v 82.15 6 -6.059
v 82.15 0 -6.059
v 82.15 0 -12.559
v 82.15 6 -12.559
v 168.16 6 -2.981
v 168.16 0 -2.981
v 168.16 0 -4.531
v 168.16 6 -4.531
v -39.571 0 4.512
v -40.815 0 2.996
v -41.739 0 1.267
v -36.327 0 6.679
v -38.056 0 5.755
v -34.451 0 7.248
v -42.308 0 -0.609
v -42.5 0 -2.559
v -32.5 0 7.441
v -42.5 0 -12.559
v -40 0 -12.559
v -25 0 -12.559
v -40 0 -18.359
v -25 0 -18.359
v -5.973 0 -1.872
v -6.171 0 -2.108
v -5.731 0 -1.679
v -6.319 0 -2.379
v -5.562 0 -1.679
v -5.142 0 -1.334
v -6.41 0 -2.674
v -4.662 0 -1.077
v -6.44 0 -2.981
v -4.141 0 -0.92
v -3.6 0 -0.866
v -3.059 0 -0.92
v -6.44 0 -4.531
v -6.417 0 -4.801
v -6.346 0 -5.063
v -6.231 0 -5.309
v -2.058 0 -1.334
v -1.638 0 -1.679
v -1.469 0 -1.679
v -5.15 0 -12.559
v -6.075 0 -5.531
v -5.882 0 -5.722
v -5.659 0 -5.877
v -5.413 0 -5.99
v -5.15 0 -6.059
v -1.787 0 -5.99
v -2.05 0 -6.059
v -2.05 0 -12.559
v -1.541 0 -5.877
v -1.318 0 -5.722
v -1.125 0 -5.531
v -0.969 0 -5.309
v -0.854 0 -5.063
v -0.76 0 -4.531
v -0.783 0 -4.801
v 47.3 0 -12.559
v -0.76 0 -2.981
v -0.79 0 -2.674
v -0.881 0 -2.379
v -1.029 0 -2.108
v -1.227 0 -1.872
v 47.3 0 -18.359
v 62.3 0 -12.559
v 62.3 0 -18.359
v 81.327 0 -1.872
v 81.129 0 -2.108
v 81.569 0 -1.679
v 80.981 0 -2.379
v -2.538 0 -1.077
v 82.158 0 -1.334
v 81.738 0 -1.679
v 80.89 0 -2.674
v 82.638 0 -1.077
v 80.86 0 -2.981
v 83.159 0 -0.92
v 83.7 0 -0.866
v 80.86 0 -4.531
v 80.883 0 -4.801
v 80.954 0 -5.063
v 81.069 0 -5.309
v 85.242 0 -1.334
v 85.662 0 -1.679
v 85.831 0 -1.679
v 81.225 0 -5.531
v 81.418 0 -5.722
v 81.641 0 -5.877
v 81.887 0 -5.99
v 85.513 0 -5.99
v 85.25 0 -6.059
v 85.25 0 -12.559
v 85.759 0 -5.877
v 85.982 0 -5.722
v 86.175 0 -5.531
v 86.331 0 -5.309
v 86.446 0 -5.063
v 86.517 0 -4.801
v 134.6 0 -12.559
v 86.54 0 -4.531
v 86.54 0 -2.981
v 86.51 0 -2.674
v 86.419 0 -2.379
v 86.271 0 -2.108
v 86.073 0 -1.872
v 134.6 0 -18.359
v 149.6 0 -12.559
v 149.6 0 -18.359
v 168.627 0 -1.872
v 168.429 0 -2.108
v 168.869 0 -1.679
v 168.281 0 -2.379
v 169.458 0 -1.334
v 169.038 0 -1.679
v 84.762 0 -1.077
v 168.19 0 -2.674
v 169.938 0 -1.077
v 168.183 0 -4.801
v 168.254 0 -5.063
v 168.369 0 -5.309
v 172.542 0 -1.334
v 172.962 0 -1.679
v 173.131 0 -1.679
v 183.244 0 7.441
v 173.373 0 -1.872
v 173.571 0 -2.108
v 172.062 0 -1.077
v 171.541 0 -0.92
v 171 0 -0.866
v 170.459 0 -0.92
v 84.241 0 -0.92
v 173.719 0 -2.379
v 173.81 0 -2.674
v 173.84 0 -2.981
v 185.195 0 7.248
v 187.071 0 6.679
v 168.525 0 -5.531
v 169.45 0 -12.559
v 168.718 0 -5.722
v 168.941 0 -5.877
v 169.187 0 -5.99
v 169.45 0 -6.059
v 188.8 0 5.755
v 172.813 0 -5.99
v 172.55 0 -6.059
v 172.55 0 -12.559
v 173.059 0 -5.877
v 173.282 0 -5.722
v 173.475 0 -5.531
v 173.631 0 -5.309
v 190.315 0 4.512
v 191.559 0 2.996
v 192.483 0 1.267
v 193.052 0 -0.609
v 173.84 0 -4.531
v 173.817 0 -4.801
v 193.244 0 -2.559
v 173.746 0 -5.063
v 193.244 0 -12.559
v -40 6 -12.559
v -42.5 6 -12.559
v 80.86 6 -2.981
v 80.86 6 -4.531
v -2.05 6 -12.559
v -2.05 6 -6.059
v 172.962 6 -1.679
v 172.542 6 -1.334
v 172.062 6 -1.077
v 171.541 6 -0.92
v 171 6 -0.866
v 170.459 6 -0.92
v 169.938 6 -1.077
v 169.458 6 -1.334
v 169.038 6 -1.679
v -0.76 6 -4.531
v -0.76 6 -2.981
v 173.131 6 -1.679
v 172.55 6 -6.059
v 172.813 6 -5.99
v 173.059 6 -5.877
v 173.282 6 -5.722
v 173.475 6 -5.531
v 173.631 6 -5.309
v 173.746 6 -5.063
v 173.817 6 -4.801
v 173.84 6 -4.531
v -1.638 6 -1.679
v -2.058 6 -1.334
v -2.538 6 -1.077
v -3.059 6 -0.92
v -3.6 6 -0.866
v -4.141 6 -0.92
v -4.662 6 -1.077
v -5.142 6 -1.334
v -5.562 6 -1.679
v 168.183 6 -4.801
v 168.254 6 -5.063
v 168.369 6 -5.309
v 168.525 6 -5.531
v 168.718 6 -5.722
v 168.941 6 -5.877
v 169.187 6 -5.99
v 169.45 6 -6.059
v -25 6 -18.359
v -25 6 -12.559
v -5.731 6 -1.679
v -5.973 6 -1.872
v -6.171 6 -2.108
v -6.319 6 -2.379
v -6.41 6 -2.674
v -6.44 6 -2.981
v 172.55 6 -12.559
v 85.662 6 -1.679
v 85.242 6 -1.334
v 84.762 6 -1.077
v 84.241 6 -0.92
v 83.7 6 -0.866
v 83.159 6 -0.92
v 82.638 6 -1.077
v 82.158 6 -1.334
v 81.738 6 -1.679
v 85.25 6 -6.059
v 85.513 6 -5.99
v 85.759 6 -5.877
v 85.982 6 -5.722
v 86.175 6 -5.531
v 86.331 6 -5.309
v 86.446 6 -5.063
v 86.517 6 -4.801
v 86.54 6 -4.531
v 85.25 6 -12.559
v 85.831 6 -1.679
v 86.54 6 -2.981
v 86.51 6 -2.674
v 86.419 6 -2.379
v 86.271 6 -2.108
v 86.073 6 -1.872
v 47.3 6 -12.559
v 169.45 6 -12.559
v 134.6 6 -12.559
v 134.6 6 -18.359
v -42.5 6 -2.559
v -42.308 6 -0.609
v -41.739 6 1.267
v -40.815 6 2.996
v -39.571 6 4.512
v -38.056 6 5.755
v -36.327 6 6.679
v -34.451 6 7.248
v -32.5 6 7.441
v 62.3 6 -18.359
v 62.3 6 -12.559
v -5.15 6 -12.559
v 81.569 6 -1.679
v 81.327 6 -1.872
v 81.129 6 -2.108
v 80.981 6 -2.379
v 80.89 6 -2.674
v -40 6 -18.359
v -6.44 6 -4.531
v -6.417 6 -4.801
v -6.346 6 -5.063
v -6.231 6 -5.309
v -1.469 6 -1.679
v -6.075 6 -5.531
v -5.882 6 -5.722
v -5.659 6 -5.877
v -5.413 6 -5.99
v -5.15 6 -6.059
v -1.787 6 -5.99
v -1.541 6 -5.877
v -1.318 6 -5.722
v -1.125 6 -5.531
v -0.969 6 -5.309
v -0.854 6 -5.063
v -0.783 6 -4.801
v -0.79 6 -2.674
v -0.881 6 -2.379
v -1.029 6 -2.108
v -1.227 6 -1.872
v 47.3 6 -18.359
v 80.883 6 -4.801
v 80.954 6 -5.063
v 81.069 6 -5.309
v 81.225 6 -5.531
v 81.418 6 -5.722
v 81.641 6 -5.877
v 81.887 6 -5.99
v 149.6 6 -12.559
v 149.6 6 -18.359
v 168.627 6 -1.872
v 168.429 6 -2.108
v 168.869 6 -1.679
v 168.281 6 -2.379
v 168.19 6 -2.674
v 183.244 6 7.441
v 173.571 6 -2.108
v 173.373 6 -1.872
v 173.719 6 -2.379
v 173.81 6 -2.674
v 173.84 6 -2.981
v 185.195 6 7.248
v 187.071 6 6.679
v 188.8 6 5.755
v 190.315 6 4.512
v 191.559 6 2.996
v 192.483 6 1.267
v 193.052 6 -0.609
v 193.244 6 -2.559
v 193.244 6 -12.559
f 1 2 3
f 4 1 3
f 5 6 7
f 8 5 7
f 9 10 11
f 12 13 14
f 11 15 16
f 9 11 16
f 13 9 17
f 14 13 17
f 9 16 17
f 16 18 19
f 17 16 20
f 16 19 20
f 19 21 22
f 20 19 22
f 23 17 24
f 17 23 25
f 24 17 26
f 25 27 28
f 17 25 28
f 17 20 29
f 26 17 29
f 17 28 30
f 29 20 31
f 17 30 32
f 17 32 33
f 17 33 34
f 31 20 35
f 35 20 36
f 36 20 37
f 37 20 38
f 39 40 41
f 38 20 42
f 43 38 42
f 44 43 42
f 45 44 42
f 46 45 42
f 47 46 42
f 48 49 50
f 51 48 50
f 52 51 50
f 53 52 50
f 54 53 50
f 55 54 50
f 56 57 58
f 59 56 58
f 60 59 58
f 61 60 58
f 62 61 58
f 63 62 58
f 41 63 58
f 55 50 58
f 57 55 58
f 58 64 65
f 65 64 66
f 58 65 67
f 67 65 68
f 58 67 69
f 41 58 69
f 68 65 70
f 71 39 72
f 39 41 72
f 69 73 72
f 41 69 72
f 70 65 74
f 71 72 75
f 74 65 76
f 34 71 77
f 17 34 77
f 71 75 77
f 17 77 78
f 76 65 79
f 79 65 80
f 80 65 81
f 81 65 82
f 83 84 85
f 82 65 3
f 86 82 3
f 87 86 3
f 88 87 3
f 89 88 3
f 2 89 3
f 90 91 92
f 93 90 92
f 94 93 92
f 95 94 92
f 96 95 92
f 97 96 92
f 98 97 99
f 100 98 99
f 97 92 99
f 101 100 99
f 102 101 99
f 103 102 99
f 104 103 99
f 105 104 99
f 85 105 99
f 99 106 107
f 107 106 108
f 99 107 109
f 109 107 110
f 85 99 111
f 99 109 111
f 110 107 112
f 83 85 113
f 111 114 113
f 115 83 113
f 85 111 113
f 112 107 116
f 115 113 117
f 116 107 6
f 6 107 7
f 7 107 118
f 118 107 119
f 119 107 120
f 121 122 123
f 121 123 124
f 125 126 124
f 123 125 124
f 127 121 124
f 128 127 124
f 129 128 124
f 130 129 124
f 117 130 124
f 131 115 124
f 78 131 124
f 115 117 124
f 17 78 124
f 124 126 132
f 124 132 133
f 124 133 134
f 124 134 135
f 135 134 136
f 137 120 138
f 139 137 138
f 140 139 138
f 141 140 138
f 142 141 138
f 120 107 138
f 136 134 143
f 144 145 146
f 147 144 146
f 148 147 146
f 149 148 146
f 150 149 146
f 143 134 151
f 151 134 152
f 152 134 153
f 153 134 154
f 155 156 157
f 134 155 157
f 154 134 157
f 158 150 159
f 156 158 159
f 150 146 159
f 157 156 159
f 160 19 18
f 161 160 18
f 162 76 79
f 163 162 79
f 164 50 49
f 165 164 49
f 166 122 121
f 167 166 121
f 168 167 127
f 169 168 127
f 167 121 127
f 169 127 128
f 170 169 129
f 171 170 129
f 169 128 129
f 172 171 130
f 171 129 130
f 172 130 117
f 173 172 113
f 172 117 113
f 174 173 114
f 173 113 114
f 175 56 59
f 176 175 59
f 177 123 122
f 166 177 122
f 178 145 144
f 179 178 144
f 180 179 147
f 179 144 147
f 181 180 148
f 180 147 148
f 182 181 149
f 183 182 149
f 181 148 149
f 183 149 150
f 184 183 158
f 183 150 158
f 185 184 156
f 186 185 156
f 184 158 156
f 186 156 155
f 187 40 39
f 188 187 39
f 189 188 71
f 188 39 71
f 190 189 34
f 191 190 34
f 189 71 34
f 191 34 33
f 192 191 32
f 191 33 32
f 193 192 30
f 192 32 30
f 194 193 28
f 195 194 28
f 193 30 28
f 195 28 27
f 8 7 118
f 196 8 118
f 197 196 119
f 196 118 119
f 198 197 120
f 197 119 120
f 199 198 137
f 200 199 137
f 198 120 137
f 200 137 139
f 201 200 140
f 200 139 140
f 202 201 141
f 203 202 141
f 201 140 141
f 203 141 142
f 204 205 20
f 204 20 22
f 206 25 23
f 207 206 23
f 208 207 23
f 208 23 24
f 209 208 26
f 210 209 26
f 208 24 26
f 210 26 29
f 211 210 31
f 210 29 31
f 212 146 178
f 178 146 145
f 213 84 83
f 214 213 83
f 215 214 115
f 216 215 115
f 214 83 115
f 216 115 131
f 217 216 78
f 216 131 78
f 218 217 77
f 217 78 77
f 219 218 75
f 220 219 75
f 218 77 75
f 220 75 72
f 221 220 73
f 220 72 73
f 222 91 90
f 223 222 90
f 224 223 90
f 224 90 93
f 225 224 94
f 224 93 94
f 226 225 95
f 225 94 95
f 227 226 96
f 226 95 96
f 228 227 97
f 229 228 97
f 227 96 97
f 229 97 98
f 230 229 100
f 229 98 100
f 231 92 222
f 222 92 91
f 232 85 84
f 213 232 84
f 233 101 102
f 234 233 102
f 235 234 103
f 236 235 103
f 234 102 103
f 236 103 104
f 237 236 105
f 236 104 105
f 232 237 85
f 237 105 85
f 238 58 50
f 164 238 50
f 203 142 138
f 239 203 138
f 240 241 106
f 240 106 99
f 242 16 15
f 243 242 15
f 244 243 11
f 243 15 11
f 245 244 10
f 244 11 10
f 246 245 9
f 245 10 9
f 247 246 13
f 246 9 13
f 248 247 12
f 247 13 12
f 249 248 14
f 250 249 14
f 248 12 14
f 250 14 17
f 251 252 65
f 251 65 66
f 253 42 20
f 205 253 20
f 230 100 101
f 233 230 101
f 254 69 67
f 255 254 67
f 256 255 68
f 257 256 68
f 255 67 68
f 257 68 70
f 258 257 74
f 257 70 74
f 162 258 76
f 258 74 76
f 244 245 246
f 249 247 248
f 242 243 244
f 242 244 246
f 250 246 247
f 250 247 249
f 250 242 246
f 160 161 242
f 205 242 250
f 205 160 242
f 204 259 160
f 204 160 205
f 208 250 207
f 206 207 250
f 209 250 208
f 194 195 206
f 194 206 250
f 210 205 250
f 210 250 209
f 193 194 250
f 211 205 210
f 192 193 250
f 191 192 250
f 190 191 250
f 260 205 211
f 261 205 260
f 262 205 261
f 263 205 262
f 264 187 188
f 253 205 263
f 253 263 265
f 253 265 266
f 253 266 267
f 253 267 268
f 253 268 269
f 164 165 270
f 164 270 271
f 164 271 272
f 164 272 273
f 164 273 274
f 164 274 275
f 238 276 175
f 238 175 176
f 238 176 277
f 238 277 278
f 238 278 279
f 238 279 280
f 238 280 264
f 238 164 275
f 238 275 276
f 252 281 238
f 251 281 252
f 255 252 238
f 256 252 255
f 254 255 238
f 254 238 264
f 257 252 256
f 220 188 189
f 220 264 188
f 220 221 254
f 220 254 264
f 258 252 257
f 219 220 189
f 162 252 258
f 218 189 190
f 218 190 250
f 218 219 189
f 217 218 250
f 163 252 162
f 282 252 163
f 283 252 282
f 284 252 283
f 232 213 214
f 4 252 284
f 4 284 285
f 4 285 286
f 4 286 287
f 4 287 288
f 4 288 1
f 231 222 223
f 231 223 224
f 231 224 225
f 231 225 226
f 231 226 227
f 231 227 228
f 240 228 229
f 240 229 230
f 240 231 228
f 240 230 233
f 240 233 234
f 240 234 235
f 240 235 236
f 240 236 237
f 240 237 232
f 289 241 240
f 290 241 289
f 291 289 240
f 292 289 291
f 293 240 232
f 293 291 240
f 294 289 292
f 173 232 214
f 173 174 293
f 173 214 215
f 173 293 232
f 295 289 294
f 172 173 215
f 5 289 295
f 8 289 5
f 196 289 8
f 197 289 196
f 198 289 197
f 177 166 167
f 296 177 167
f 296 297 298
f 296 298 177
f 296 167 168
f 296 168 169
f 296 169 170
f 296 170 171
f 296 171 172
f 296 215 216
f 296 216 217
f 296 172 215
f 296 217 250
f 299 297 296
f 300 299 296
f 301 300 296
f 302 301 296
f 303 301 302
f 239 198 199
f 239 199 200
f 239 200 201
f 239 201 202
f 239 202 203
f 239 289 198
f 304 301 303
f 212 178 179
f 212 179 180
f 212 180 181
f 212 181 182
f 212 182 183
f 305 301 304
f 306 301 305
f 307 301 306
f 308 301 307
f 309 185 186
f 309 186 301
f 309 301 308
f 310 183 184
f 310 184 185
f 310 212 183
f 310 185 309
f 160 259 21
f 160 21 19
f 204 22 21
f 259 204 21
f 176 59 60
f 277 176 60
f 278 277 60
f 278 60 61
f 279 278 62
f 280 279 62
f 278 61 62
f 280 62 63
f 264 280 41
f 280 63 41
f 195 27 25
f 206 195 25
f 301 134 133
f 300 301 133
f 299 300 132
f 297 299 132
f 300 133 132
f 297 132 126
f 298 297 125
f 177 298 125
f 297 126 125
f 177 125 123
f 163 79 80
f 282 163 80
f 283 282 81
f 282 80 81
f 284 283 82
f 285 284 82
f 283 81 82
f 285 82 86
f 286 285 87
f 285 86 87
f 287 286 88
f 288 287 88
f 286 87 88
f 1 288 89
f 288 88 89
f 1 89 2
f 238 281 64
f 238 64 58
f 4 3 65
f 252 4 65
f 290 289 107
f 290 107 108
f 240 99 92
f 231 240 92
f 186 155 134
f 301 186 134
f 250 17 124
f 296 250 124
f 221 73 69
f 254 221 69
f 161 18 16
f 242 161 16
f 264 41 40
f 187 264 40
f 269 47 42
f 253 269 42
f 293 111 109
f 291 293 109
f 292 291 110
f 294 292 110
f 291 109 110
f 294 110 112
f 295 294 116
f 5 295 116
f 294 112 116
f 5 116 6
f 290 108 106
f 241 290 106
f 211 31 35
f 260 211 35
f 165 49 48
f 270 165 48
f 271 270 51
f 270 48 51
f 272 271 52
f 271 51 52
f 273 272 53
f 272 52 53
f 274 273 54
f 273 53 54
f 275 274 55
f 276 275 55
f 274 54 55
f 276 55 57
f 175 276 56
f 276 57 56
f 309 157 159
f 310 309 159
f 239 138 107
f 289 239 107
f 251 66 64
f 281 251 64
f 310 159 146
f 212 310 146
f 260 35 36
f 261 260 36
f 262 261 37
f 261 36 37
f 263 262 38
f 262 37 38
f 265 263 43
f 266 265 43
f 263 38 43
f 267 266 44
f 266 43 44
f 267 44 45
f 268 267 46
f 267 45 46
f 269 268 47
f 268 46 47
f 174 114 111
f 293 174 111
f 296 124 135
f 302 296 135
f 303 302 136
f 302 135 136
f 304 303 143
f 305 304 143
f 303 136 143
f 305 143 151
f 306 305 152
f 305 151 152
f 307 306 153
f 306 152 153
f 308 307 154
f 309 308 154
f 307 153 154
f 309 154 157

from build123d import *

# Parameters (mm, degrees)
SALIENTE_EXTRUIR1_DEPTH = 6


with BuildPart() as part:
    # Croquis1 → Saliente-Extruir1 (new body)
    with BuildSketch(Plane(origin=(0, 0, 0), x_dir=(1, 0, 0), z_dir=(0, 1, 0))):
        with BuildLine():
            Line((193.24437935, 2.559419019), (193.24437935, 12.559419019))
            Line((193.24437935, 12.559419019), (172.55, 12.559419019))
            Line((172.55, 12.559419019), (172.55, 6.059193777))
            ThreePointArc((172.55, 6.059193777), (173.474604635, 5.531104241), (173.840337631, 4.531098409))
            Line((173.840337631, 4.531098409), (173.840337631, 2.981098409))
            ThreePointArc((173.840337631, 2.981098409), (173.651640801, 2.239914437), (173.131494174, 1.679193777))
            Line((173.131494174, 1.679193777), (172.962249241, 1.679193777))
            ThreePointArc((172.962249241, 1.679193777), (171, 0.866183792), (169.037750759, 1.679193777))
            Line((169.037750759, 1.679193777), (168.868505826, 1.679193777))
            ThreePointArc((168.868505826, 1.679193777), (168.348359199, 2.239914437), (168.159662369, 2.981098409))
            Line((168.159662369, 2.981098409), (168.159662369, 4.531098409))
            ThreePointArc((168.159662369, 4.531098409), (168.525395365, 5.531104241), (169.45, 6.059193777))
            Line((169.45, 6.059193777), (169.45, 12.559419019))
            Line((169.45, 12.559419019), (152.1, 12.559419019))
            Line((152.1, 12.559419019), (149.6, 12.559419019))
            Line((149.6, 12.559419019), (149.6, 18.359419019))
            Line((149.6, 18.359419019), (134.6, 18.359419019))
            Line((134.6, 18.359419019), (134.6, 12.559419019))
            Line((134.6, 12.559419019), (132.1, 12.559419019))
            Line((132.1, 12.559419019), (85.25, 12.559419019))
            Line((85.25, 12.559419019), (85.25, 6.059193777))
            ThreePointArc((85.25, 6.059193777), (86.174604635, 5.531104241), (86.540337631, 4.531098409))
            Line((86.540337631, 4.531098409), (86.540337631, 2.981098409))
            ThreePointArc((86.540337631, 2.981098409), (86.351640801, 2.239914437), (85.831494174, 1.679193777))
            Line((85.831494174, 1.679193777), (85.662249241, 1.679193777))
            ThreePointArc((85.662249241, 1.679193777), (83.7, 0.866183792), (81.737750759, 1.679193777))
            Line((81.737750759, 1.679193777), (81.568505826, 1.679193777))
            ThreePointArc((81.568505826, 1.679193777), (81.048359199, 2.239914437), (80.859662369, 2.981098409))
            Line((80.859662369, 2.981098409), (80.859662369, 4.531098409))
            ThreePointArc((80.859662369, 4.531098409), (81.225395365, 5.531104241), (82.15, 6.059193777))
            Line((82.15, 6.059193777), (82.15, 12.559419019))
            Line((82.15, 12.559419019), (64.8, 12.559419019))
            Line((64.8, 12.559419019), (62.3, 12.559419019))
            Line((62.3, 12.559419019), (62.3, 18.359419019))
            Line((62.3, 18.359419019), (47.3, 18.359419019))
            Line((47.3, 18.359419019), (47.3, 12.559419019))
            Line((47.3, 12.559419019), (44.8, 12.559419019))
            Line((44.8, 12.559419019), (-2.05, 12.559419019))
            Line((-2.05, 12.559419019), (-2.05, 6.059193777))
            ThreePointArc((-2.05, 6.059193777), (-1.125395365, 5.531104241), (-0.759662369, 4.531098409))
            Line((-0.759662369, 4.531098409), (-0.759662369, 2.981098409))
            ThreePointArc((-0.759662369, 2.981098409), (-0.948359199, 2.239914437), (-1.468505826, 1.679193777))
            Line((-1.468505826, 1.679193777), (-1.637750759, 1.679193777))
            ThreePointArc((-1.637750759, 1.679193777), (-3.6, 0.866183792), (-5.562249241, 1.679193777))
            Line((-5.562249241, 1.679193777), (-5.731494174, 1.679193777))
            ThreePointArc((-5.731494174, 1.679193777), (-6.251640801, 2.239914437), (-6.440337631, 2.981098409))
            Line((-6.440337631, 2.981098409), (-6.440337631, 4.531098409))
            ThreePointArc((-6.440337631, 4.531098409), (-6.074604635, 5.531104241), (-5.15, 6.059193777))
            Line((-5.15, 6.059193777), (-5.15, 12.559419019))
            Line((-5.15, 12.559419019), (-22.5, 12.559419019))
            Line((-22.5, 12.559419019), (-25, 12.559419019))
            Line((-25, 12.559419019), (-25, 18.359419019))
            Line((-25, 18.359419019), (-40, 18.359419019))
            Line((-40, 18.359419019), (-40, 12.559419019))
            Line((-40, 12.559419019), (-42.5, 12.559419019))
            Line((-42.5, 12.559419019), (-42.5, 2.559419019))
            ThreePointArc((-42.5, 2.559419019), (-39.571067812, -4.511648793), (-32.5, -7.440580981))
            Line((-32.5, -7.440580981), (183.24437935, -7.440580981))
            ThreePointArc((183.24437935, -7.440580981), (190.315447162, -4.511648793), (193.24437935, 2.559419019))
        make_face()
    extrude(amount=SALIENTE_EXTRUIR1_DEPTH)


solid = part.part
